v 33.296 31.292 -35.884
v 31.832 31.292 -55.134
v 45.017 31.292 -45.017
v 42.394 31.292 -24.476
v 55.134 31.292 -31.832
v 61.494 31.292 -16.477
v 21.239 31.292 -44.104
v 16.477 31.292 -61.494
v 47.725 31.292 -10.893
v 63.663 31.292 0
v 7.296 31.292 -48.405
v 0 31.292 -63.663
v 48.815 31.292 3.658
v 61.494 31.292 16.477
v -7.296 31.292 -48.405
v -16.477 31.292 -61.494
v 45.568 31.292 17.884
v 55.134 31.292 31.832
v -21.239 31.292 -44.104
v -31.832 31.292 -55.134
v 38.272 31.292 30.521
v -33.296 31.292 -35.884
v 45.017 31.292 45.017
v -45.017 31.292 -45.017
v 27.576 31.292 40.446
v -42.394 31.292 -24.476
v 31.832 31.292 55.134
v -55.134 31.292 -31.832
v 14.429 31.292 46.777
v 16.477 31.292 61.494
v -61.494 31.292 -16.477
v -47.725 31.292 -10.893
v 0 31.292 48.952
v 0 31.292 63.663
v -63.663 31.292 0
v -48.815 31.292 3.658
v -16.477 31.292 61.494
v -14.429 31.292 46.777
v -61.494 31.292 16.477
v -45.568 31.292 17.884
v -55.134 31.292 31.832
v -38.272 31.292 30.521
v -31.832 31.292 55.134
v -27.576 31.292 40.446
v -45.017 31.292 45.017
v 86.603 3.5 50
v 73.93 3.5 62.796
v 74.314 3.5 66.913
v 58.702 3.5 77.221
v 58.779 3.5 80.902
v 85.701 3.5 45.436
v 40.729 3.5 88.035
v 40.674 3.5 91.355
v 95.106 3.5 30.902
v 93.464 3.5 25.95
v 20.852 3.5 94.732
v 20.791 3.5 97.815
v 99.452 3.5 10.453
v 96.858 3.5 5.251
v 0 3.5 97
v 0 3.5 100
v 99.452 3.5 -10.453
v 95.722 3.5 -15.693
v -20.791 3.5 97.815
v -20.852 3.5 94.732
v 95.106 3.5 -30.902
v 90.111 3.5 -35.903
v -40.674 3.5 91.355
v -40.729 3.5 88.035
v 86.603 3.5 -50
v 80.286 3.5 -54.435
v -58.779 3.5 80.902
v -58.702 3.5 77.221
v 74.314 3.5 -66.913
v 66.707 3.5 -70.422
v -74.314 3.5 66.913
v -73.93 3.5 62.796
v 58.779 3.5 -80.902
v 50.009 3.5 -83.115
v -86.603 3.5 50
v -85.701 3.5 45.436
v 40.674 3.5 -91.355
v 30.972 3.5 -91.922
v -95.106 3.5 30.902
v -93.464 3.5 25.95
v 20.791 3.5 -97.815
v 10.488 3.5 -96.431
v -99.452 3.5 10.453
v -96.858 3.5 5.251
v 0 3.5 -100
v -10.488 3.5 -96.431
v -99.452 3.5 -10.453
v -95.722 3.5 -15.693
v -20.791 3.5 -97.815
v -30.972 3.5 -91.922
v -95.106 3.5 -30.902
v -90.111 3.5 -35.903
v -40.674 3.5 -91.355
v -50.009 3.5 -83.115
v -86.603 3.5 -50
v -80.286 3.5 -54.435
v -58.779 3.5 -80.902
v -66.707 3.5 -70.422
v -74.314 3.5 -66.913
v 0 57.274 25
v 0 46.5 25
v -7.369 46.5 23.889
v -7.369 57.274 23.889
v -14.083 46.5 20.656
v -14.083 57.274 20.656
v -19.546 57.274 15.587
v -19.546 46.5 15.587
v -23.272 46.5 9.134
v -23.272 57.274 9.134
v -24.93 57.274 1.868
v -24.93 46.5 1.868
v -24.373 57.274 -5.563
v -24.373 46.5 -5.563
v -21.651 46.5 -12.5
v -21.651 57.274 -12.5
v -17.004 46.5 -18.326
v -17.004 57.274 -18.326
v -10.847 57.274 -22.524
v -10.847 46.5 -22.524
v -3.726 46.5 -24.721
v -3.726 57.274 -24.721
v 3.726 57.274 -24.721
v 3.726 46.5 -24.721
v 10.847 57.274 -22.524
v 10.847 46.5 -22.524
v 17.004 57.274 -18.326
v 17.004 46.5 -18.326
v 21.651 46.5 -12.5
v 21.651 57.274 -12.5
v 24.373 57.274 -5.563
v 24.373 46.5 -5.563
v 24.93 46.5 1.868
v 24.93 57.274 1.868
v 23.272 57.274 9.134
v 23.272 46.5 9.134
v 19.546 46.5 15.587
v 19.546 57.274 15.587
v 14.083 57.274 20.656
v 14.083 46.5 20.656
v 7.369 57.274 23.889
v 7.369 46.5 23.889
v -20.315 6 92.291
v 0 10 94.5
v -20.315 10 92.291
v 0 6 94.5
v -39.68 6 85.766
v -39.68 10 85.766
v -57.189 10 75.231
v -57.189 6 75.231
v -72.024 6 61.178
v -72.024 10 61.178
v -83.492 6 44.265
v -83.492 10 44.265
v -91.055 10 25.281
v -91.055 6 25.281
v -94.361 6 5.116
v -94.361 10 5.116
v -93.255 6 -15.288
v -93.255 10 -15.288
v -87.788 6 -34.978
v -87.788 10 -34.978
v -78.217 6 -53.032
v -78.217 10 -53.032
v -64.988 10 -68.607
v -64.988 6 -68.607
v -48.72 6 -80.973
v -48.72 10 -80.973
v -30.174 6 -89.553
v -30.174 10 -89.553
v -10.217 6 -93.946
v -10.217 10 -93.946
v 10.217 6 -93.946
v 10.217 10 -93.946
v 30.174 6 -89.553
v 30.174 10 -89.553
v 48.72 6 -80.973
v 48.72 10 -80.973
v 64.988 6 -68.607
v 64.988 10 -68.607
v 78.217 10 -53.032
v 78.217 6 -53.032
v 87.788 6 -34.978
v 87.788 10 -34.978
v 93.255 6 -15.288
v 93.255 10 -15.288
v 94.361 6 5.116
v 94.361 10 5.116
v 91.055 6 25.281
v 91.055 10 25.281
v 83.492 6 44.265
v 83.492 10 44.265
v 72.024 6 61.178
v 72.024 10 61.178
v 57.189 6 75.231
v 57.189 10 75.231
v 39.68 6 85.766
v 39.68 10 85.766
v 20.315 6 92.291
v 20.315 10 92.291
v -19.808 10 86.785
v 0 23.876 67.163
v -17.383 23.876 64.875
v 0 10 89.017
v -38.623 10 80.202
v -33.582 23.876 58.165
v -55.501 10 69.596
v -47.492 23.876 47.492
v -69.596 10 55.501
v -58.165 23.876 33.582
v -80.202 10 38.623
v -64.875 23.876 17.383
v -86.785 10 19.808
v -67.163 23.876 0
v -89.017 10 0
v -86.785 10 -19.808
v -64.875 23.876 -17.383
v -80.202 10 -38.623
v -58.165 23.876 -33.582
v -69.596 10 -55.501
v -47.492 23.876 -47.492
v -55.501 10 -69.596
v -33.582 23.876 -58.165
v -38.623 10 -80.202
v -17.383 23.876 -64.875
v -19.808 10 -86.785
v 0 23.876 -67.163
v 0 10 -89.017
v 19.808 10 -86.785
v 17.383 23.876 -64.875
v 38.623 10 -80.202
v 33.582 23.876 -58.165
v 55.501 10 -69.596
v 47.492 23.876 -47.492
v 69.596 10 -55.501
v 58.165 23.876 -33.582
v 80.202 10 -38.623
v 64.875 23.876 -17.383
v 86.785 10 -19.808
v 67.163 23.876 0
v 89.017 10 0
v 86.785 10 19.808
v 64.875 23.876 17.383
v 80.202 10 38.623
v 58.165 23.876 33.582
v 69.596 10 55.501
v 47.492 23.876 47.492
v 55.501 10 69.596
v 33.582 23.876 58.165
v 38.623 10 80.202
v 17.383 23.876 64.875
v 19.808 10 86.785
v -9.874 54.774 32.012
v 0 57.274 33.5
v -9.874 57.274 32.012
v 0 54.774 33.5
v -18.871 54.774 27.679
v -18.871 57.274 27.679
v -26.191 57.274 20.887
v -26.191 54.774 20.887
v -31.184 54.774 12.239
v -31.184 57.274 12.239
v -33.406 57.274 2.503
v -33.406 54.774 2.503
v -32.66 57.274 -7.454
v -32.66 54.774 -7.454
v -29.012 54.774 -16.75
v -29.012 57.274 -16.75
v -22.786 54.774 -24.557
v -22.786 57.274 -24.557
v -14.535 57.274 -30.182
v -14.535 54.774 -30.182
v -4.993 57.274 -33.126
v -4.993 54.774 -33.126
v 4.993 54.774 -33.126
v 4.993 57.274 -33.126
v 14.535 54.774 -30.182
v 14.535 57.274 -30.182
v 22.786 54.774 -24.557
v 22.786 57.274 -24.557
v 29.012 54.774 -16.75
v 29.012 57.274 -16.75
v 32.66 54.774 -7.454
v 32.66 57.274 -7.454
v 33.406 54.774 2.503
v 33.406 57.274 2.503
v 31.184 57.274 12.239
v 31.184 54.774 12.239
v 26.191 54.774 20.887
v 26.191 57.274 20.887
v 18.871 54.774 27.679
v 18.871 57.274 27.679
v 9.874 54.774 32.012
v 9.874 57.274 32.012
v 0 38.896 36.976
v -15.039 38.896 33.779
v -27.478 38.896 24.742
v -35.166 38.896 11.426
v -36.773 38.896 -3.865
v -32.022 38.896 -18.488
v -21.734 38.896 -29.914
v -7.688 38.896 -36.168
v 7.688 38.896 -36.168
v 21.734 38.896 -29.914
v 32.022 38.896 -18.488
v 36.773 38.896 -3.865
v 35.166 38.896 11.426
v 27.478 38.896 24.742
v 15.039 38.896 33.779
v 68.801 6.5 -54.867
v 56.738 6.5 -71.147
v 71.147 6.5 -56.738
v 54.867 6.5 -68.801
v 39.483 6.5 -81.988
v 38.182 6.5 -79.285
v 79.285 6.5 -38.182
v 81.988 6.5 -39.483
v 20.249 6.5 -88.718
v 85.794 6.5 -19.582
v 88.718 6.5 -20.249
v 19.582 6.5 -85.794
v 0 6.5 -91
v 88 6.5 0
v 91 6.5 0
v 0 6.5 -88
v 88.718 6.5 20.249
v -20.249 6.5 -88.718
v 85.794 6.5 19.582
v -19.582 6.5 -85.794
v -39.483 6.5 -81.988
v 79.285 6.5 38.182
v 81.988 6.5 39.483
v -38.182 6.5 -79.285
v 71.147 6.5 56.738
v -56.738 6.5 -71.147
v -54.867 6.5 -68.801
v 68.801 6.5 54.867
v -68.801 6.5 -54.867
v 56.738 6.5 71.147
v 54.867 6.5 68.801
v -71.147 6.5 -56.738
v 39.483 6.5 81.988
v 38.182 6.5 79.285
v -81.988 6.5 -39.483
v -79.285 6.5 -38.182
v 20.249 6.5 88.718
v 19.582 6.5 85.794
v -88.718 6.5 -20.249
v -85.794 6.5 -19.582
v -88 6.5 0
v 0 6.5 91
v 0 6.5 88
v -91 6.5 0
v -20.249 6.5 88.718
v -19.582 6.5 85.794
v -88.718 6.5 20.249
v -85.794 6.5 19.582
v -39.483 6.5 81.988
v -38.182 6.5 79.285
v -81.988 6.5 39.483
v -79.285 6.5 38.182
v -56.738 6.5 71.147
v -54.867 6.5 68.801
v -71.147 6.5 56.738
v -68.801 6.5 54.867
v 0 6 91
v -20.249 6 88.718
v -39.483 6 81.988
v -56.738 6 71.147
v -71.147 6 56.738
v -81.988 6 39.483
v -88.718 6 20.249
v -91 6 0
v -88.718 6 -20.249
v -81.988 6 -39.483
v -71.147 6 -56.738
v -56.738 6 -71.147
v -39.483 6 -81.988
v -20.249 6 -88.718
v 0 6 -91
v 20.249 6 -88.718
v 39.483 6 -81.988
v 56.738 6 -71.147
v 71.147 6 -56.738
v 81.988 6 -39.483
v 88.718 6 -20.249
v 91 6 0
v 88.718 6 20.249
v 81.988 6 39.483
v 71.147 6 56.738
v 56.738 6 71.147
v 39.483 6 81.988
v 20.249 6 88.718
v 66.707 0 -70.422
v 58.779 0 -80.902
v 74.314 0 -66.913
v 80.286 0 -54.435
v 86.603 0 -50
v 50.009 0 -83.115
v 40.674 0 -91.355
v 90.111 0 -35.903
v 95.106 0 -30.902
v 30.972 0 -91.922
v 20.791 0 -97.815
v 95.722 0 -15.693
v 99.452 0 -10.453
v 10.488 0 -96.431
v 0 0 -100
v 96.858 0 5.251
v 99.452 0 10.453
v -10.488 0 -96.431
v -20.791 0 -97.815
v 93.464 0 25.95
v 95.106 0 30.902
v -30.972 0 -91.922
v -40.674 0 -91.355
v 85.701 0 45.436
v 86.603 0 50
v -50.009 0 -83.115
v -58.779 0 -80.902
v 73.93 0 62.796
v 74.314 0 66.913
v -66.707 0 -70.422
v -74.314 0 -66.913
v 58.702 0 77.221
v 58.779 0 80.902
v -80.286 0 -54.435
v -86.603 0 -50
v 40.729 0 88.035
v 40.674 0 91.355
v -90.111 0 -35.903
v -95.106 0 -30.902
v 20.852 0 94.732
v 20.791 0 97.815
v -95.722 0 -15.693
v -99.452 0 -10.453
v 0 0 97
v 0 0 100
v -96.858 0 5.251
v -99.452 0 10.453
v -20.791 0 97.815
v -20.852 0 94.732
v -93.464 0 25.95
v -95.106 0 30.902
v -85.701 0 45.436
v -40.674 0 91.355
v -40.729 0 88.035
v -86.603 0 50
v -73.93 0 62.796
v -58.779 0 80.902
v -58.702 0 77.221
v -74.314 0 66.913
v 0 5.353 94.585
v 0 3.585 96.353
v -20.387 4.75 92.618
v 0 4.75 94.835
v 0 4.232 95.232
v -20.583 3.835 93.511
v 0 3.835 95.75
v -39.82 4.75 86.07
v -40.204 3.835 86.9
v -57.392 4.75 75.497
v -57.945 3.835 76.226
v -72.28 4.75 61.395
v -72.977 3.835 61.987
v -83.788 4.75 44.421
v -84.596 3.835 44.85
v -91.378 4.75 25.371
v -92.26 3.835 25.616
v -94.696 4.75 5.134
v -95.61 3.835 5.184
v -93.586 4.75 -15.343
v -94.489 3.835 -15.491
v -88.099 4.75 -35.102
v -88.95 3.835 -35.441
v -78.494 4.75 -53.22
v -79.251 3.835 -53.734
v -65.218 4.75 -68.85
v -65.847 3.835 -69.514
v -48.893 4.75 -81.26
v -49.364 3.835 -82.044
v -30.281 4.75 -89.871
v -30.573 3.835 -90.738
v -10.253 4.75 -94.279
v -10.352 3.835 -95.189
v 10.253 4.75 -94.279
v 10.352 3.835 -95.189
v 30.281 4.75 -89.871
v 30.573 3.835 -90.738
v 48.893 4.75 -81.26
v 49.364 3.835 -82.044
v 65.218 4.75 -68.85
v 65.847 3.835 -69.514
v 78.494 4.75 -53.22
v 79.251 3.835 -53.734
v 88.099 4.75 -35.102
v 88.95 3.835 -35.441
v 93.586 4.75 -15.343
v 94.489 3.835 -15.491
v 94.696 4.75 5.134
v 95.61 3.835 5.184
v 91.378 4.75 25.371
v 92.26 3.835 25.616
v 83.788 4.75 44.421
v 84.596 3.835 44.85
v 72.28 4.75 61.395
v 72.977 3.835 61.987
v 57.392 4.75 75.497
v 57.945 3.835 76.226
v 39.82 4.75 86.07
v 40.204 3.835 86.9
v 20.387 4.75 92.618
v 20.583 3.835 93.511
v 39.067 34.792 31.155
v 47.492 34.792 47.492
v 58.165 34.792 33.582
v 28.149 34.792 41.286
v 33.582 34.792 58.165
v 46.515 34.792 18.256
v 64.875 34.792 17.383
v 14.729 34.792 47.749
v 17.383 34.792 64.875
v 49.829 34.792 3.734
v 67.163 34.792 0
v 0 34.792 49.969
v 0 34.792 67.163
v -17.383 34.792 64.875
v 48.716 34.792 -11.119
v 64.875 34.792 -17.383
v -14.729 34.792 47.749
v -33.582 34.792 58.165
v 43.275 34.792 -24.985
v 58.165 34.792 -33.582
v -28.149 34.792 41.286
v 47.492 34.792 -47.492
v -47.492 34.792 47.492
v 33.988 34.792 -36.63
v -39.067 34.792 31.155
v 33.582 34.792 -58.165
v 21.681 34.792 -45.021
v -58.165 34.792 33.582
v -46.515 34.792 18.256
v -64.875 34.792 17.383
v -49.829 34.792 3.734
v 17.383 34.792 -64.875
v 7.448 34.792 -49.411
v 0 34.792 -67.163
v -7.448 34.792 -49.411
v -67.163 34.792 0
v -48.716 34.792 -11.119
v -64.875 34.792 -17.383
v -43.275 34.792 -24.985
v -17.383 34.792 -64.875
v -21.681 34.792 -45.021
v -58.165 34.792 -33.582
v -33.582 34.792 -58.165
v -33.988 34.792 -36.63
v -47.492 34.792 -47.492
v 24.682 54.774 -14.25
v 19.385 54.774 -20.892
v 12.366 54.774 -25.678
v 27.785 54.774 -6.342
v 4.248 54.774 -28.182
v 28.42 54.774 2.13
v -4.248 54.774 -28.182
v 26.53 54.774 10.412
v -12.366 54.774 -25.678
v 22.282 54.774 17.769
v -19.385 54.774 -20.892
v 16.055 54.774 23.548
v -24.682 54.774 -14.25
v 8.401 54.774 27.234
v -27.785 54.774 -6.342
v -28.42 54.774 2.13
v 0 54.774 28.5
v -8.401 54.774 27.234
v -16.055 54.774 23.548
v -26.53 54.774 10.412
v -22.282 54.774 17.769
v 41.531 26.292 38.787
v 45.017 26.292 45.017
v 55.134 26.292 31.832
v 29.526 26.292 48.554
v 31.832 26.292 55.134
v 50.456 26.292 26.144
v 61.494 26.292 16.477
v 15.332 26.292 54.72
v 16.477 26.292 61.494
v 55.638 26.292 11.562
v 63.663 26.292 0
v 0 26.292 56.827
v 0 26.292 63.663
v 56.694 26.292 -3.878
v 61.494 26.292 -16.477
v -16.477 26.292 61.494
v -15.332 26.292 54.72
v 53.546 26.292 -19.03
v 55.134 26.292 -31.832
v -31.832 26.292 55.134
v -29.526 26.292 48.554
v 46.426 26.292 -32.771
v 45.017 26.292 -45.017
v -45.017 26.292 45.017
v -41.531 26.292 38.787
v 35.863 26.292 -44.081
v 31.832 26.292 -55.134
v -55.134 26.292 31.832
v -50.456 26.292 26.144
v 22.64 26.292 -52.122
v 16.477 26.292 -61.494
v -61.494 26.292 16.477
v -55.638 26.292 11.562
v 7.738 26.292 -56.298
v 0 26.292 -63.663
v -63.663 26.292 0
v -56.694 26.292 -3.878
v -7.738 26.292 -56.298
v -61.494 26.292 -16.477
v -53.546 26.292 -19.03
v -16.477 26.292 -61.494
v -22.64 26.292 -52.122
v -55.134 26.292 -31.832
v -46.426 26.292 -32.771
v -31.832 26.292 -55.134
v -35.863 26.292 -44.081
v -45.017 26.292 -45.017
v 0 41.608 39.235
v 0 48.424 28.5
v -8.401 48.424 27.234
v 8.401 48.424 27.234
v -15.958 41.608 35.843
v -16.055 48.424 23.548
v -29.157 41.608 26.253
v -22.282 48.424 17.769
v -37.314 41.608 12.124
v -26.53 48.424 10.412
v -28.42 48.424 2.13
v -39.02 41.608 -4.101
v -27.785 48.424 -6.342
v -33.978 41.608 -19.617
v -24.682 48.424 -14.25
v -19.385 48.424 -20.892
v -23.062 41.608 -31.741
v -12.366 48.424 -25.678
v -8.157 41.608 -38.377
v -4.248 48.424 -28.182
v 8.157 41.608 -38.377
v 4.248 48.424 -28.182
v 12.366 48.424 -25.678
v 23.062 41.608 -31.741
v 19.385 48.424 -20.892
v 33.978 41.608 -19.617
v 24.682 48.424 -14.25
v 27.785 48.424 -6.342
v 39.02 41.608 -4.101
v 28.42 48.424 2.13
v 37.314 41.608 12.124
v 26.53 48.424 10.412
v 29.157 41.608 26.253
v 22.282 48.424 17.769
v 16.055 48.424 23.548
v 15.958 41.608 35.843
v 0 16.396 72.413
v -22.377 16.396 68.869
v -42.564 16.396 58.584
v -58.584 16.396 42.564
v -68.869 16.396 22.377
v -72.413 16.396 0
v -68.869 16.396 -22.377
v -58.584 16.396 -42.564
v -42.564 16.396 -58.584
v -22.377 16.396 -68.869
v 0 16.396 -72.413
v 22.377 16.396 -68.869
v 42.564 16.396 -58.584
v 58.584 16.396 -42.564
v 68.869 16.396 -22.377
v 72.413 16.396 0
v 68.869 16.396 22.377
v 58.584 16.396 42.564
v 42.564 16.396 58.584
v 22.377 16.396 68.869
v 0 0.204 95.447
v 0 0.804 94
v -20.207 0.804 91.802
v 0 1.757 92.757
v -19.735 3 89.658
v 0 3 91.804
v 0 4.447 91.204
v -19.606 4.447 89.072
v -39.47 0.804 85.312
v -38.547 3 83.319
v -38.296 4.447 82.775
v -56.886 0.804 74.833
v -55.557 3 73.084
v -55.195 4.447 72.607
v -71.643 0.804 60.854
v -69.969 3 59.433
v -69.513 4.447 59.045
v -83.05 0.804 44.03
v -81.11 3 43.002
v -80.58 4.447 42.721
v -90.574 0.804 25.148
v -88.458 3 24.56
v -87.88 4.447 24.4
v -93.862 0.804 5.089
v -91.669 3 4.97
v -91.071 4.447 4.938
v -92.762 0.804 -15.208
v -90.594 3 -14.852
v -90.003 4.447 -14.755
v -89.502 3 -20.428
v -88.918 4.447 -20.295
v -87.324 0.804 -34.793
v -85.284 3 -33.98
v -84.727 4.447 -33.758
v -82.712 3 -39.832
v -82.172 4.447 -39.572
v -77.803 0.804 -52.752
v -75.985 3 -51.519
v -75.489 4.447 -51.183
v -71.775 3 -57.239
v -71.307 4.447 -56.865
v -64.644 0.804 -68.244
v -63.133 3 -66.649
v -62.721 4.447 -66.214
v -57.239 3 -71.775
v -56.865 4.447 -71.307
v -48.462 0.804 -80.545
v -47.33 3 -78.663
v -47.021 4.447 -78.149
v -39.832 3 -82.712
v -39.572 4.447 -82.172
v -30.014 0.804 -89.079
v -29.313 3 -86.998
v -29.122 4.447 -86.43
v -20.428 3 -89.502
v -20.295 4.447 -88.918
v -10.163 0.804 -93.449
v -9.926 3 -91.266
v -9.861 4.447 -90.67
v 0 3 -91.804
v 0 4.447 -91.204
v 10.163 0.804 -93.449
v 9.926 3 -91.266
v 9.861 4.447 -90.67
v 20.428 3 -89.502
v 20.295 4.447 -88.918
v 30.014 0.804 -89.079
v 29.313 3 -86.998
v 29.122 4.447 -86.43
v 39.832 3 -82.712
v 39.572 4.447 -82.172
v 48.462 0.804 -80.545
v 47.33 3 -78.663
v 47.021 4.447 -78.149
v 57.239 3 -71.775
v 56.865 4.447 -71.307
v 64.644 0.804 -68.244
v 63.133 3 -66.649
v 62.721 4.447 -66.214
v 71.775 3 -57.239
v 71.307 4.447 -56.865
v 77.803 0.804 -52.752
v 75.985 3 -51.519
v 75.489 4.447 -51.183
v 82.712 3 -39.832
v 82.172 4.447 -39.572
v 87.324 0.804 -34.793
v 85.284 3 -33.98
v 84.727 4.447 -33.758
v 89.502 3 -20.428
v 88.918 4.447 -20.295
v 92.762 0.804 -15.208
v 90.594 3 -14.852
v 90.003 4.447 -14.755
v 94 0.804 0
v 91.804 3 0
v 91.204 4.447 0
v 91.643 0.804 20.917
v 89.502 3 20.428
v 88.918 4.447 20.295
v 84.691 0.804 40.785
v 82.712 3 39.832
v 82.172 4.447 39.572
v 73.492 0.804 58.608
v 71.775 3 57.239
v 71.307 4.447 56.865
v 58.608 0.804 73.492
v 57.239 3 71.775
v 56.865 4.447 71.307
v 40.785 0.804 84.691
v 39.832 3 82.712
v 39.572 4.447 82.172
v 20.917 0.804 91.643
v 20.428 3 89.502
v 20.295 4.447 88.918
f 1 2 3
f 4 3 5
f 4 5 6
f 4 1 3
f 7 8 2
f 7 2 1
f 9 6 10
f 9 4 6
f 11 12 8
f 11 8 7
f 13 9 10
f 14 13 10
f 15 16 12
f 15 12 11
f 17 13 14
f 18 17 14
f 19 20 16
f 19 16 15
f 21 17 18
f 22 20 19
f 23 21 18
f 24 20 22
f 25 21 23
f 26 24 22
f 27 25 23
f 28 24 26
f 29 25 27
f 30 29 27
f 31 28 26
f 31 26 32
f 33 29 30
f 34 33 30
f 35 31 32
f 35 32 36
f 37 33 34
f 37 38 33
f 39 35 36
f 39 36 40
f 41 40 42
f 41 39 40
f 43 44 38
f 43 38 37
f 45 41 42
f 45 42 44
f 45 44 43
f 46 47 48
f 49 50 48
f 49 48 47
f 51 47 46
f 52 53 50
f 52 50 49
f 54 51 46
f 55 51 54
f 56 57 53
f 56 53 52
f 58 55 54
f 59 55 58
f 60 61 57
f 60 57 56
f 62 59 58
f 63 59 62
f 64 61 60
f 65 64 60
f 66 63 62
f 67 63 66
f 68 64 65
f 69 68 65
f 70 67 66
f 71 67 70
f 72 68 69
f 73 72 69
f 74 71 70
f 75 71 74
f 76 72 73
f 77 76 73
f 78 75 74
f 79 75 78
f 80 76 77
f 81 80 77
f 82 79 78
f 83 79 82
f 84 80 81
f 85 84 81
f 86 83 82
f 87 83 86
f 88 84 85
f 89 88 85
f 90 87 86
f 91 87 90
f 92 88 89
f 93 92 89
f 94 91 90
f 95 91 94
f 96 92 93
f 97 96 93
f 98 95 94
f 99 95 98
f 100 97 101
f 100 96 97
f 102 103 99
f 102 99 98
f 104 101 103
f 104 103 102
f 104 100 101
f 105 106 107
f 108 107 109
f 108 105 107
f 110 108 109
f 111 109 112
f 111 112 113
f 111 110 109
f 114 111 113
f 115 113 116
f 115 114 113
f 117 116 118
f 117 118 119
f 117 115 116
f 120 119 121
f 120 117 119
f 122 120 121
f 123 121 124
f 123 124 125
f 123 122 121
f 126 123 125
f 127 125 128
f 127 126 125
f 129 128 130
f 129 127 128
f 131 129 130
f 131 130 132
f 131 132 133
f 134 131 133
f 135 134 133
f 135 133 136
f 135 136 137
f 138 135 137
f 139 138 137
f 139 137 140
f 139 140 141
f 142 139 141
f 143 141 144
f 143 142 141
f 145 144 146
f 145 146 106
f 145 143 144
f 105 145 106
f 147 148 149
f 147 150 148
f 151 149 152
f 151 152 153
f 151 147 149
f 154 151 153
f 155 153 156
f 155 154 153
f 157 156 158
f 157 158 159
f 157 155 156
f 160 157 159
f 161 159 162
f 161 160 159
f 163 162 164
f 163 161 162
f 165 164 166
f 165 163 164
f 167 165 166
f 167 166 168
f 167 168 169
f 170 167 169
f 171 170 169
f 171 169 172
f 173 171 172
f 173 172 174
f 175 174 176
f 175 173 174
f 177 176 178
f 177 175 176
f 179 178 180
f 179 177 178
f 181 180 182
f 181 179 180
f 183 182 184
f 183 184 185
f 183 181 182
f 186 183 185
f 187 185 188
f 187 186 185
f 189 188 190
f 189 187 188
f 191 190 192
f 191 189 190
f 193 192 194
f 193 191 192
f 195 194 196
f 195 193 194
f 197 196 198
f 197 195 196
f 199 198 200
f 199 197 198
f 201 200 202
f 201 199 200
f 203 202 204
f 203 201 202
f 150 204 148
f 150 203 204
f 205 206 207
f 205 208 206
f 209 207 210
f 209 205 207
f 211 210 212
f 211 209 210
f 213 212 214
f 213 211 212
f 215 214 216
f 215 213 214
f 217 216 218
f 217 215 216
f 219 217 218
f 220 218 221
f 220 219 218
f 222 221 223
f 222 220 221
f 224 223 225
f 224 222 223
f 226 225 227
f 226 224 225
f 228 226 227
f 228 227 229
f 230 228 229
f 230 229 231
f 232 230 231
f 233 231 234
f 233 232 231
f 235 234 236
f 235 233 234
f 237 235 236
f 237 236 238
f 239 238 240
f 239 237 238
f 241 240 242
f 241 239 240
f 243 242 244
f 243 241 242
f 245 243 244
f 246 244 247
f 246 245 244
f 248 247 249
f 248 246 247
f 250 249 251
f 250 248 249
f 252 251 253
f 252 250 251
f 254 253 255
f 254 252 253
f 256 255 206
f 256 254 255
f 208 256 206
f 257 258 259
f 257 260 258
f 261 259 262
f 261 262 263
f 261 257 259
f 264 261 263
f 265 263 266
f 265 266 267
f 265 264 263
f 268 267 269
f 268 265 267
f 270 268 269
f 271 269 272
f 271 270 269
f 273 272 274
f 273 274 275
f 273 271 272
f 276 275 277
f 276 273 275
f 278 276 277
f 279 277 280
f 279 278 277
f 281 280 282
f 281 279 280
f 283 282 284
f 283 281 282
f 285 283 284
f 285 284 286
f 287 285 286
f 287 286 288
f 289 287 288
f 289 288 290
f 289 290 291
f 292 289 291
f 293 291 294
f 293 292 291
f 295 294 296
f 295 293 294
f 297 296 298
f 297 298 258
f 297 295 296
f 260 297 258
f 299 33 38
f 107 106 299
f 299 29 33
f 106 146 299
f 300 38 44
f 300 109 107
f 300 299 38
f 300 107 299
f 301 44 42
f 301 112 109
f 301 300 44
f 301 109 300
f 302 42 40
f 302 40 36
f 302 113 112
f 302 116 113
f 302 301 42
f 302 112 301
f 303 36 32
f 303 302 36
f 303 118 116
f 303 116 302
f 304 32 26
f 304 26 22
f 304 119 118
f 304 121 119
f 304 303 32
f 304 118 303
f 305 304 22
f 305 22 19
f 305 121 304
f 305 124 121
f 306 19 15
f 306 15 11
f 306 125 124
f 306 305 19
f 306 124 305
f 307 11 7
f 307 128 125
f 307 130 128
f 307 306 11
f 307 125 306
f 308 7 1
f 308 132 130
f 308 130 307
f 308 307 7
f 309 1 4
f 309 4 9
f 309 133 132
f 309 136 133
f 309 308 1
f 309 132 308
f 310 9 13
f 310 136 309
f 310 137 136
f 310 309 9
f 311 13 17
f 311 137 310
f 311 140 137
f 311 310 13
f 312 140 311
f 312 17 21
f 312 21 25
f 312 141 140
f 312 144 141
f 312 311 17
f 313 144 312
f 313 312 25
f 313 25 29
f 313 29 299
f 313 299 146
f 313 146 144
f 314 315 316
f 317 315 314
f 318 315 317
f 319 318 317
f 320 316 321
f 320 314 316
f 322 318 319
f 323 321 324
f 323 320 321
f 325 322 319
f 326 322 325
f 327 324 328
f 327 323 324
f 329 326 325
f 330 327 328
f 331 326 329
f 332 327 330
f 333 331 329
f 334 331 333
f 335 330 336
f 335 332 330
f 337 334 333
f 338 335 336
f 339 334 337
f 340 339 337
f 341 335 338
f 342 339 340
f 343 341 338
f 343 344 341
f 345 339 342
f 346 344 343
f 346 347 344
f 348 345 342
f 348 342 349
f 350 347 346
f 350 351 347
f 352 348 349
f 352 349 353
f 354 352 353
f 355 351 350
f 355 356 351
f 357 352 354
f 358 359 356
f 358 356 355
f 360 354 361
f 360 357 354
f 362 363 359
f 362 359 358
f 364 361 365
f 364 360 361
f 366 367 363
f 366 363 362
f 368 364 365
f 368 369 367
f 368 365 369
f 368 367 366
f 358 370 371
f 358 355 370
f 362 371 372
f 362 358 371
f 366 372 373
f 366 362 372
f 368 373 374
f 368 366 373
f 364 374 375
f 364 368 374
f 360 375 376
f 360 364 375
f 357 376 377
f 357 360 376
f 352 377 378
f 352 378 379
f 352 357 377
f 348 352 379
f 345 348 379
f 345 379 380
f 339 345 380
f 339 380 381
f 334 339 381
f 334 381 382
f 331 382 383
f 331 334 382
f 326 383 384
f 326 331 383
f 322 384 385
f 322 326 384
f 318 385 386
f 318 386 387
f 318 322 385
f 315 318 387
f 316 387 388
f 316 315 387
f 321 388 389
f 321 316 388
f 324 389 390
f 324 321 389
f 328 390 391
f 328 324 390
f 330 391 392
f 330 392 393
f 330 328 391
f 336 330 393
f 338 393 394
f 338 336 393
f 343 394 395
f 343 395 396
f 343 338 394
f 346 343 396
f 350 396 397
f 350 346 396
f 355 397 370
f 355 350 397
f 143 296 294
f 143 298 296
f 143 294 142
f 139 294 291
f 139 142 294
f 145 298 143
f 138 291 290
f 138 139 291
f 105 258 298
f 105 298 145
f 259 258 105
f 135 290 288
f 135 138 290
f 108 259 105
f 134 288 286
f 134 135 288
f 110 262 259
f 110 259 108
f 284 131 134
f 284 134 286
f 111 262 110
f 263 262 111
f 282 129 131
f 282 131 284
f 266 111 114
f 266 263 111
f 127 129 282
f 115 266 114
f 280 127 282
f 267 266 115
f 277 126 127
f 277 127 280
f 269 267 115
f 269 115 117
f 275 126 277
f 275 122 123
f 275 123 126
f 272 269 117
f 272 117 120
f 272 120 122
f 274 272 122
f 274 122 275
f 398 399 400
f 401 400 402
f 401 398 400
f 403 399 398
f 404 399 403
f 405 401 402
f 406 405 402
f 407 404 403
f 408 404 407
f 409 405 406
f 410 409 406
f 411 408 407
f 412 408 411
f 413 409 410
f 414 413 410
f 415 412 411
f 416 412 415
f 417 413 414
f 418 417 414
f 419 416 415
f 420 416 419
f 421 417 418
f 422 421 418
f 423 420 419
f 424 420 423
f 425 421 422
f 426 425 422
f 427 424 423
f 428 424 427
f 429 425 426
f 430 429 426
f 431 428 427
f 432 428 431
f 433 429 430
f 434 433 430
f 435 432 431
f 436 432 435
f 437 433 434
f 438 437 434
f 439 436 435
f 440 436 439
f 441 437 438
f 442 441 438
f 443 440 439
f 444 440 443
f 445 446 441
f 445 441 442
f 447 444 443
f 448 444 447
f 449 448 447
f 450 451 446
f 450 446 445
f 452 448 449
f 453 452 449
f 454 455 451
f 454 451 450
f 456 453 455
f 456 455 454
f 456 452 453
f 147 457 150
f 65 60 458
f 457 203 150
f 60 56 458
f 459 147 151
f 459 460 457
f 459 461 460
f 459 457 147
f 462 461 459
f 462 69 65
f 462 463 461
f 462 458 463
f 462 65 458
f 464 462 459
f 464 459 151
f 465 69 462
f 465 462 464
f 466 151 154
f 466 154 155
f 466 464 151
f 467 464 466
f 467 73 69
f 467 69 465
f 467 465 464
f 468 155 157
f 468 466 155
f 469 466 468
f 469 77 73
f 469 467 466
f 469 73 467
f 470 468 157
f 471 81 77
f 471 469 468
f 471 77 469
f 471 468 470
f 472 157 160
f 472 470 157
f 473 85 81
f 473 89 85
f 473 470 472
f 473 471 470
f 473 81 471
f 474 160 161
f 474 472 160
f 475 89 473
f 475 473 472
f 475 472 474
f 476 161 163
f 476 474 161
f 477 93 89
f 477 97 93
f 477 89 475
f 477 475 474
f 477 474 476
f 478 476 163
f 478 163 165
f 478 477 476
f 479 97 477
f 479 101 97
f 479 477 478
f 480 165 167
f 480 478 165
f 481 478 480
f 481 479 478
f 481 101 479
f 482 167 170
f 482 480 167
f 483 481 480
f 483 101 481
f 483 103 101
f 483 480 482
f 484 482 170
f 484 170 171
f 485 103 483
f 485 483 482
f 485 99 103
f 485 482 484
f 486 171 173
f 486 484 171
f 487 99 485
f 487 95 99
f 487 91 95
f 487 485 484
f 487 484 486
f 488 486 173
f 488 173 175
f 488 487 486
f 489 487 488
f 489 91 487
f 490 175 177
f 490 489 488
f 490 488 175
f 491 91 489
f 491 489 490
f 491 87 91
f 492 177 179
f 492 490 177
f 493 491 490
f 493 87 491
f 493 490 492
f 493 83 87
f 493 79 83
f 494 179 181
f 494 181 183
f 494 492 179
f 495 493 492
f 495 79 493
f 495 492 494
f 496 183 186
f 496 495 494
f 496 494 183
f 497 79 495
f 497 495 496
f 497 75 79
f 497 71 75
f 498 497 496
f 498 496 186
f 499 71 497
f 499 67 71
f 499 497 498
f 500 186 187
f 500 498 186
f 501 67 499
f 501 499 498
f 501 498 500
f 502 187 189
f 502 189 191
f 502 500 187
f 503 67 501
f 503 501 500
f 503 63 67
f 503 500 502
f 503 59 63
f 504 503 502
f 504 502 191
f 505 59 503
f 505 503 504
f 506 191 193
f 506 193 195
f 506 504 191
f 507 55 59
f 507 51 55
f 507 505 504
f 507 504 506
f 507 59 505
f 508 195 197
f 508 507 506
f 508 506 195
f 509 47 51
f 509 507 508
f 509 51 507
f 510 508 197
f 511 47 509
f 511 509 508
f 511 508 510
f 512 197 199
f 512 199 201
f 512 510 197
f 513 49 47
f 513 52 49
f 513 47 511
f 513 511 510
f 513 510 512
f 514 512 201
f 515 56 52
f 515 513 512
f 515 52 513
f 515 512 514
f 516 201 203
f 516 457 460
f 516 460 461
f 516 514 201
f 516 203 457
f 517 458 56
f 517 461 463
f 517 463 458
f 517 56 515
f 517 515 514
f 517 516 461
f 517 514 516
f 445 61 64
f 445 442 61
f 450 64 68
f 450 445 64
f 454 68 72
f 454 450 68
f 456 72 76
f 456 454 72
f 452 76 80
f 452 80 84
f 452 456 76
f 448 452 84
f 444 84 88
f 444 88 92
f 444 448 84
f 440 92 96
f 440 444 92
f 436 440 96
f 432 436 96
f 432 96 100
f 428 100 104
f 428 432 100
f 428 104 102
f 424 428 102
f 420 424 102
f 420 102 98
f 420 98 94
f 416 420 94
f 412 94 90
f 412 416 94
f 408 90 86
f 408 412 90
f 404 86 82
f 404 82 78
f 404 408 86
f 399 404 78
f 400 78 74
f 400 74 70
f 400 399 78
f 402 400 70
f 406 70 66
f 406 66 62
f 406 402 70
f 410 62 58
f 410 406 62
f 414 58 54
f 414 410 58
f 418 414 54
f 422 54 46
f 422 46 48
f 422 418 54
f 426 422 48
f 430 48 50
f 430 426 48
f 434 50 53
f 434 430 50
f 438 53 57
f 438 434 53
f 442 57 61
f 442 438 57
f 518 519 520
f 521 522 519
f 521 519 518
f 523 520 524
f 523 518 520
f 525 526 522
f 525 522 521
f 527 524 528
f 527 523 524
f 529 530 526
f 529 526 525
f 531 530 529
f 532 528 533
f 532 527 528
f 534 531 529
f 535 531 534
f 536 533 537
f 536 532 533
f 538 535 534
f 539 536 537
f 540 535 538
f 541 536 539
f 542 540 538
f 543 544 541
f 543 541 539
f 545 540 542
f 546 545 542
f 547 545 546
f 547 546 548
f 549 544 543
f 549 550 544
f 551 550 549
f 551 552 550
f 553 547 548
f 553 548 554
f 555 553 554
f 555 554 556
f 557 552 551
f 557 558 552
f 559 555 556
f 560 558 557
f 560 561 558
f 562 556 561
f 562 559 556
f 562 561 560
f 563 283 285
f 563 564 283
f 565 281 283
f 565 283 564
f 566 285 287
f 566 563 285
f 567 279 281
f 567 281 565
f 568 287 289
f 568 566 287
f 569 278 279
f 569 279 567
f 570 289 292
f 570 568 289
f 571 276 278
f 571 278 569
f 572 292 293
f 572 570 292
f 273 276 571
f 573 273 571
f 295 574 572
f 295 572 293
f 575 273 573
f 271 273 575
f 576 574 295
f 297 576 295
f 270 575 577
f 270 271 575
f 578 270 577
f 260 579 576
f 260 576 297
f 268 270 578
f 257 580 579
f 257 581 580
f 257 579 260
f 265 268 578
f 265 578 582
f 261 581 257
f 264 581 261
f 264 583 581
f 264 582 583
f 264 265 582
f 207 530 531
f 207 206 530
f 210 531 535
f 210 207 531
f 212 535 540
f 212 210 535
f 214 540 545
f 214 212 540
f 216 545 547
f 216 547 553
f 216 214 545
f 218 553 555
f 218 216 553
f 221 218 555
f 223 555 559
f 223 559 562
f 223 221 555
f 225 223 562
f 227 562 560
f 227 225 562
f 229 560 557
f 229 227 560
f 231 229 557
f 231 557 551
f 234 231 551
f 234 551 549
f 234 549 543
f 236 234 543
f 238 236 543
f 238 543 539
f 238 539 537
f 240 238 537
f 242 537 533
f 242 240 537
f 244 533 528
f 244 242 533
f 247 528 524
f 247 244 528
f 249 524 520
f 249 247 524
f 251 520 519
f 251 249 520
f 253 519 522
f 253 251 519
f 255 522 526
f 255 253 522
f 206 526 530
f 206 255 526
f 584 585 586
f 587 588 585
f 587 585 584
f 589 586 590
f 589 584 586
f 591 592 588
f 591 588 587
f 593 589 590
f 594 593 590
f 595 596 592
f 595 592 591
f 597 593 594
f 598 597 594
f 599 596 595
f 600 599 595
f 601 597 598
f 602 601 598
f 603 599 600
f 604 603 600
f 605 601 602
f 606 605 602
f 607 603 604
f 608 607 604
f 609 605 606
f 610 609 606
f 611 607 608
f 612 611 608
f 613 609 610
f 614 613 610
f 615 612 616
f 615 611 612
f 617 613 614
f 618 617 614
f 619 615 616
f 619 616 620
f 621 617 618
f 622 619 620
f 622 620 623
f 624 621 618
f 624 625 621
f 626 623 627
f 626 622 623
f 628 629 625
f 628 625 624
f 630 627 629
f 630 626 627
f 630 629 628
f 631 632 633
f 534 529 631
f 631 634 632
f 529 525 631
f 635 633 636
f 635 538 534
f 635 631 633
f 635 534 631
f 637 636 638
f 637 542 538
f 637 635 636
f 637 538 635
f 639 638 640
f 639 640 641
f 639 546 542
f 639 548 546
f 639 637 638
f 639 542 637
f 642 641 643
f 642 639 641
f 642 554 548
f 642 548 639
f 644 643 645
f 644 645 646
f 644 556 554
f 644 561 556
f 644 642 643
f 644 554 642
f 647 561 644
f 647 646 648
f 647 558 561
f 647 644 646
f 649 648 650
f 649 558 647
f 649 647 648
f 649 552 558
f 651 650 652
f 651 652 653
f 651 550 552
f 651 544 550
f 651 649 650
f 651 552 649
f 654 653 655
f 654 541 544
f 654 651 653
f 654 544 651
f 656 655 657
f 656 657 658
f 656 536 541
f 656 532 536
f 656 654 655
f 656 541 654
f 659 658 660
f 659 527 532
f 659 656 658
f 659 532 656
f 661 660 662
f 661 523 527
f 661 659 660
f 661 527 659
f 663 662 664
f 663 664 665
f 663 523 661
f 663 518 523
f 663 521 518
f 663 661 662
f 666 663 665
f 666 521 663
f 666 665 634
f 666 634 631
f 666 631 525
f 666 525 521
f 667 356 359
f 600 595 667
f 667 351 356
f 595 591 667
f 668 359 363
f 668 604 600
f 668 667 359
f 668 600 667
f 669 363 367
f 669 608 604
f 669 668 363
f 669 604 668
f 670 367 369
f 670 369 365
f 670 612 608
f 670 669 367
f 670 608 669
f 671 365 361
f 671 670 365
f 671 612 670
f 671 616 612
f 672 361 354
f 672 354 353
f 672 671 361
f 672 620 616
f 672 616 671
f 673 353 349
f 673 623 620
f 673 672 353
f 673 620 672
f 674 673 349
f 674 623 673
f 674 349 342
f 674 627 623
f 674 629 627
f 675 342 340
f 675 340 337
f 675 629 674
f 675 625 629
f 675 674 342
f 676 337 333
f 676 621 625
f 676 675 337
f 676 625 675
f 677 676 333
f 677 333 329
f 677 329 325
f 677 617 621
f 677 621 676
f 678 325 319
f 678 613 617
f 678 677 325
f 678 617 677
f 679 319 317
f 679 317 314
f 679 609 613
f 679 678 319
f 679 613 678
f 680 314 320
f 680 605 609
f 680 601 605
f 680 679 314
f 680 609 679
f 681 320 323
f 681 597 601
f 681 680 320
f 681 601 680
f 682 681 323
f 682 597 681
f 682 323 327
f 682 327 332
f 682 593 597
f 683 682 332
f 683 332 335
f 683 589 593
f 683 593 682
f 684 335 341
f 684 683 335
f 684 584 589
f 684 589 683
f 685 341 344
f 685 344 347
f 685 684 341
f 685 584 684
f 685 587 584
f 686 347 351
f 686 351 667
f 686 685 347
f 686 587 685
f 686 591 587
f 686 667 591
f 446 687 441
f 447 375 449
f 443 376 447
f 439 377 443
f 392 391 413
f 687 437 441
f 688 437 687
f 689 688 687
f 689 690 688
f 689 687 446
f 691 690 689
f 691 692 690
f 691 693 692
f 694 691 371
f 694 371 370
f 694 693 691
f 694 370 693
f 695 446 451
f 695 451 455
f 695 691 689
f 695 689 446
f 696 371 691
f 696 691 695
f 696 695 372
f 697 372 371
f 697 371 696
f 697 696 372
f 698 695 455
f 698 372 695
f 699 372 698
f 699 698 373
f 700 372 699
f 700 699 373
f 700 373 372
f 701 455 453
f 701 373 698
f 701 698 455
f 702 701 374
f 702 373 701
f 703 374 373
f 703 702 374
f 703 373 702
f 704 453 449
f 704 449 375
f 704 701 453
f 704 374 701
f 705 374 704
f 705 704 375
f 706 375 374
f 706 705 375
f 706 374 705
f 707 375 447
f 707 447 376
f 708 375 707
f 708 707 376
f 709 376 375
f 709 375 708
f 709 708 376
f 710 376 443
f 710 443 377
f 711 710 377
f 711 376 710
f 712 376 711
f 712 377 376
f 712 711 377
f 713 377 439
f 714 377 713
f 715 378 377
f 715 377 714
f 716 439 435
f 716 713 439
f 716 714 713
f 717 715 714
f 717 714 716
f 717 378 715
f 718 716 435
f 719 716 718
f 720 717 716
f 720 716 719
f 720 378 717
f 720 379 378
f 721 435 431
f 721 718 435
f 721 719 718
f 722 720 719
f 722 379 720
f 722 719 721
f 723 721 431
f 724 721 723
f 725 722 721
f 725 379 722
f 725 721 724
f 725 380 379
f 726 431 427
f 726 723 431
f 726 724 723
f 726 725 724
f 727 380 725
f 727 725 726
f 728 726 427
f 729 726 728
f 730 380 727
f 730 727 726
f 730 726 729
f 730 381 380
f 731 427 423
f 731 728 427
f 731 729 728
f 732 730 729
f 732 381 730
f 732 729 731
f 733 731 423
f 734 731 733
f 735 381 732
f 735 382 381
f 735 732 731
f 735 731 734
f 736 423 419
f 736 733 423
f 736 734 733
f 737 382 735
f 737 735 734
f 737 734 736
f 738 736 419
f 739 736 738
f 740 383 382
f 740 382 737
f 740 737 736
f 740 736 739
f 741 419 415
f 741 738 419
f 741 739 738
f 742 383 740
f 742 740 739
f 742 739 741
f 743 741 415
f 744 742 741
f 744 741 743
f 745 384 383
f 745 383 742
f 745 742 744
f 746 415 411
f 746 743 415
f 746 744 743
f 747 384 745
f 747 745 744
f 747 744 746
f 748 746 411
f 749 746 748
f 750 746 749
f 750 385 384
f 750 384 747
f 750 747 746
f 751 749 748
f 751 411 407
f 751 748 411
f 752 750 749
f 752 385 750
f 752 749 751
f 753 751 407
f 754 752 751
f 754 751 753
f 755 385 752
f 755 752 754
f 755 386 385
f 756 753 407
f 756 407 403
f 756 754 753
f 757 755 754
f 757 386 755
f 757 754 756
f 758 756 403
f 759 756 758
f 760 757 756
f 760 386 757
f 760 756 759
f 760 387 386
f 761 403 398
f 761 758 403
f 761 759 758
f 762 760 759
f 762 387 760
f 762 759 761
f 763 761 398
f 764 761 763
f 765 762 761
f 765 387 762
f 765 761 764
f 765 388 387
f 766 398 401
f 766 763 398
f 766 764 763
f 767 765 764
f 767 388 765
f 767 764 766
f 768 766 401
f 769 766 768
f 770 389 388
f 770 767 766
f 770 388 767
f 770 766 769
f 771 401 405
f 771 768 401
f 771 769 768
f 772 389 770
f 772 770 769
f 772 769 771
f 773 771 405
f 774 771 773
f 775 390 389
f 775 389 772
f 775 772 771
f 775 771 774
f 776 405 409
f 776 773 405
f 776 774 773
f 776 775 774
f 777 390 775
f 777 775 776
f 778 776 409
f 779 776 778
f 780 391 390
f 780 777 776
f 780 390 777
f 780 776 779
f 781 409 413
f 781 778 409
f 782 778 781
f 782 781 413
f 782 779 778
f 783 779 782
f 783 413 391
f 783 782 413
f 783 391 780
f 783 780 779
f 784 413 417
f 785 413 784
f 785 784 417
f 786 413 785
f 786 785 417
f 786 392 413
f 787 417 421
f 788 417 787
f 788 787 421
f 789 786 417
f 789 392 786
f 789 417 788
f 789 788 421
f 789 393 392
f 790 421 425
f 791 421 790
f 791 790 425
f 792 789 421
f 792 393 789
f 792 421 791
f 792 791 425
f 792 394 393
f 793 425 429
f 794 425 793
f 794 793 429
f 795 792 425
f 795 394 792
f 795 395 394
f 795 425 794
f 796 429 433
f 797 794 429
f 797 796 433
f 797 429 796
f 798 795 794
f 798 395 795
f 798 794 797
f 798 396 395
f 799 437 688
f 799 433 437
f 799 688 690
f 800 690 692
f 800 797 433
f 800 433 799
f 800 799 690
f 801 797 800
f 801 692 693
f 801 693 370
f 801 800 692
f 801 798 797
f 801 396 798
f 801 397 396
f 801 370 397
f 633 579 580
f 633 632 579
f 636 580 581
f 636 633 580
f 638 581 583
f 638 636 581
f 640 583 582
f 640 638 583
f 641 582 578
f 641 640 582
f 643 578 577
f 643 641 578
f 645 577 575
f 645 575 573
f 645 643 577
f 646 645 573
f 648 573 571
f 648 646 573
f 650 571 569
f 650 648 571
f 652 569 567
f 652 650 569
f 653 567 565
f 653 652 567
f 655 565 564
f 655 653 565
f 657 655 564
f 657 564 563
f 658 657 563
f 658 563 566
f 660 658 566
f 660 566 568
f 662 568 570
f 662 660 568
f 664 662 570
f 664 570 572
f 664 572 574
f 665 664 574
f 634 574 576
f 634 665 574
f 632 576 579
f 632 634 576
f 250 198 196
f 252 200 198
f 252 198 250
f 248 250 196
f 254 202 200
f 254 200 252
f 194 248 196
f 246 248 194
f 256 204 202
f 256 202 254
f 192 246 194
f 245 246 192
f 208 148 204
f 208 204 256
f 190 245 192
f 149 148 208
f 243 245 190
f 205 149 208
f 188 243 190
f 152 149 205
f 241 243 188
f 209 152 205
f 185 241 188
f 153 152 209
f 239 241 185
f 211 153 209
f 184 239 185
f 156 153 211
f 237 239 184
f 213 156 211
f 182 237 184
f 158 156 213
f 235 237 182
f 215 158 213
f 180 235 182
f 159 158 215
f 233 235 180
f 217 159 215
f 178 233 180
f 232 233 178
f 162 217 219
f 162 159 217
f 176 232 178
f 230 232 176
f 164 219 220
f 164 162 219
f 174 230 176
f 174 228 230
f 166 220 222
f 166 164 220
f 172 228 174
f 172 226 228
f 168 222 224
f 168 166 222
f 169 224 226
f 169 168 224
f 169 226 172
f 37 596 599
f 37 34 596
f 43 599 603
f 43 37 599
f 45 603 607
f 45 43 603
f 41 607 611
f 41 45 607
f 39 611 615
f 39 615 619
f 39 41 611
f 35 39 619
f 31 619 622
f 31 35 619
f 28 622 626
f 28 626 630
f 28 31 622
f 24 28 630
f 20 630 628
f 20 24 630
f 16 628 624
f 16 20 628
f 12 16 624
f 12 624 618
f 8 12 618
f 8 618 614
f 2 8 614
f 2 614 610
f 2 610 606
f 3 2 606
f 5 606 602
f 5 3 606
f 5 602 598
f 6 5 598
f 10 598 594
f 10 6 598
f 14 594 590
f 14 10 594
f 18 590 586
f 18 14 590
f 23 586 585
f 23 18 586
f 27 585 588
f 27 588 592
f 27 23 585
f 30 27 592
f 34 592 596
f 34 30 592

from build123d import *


with BuildPart() as part:
    # Sketch1 → Revolve1 (revolve)
    with BuildSketch(Plane.XY, mode=Mode.PRIVATE) as revolve1_sk:
        with BuildLine():
            Line((88, 6.5), (56.826927003, 26.292427299))
            Line((56.826927003, 26.292427299), (63.663285359, 26.292427299))
            Line((63.663285359, 26.292427299), (63.663285359, 31.292427299))
            Line((63.663285359, 31.292427299), (48.951927003, 31.292427299))
            Line((48.951927003, 31.292427299), (25, 46.5))
            Line((25, 46.5), (25, 57.273651824))
            Line((25, 57.273651824), (33.5, 57.273651824))
            Line((33.5, 57.273651824), (33.5, 54.773651824))
            Line((33.5, 54.773651824), (28.5, 54.773651824))
            Line((28.5, 54.773651824), (28.5, 48.423651824))
            Line((28.5, 48.423651824), (49.969178626, 34.792427299))
            Line((49.969178626, 34.792427299), (67.163285359, 34.792427299))
            Line((67.163285359, 34.792427299), (67.163285359, 23.875534136))
            Line((67.163285359, 23.875534136), (89.017251622, 10))
            Line((89.017251622, 10), (94.5, 10))
            Line((94.5, 10), (94.5, 6))
            ThreePointArc((94.5, 6), (95.232233047, 4.232233047), (97, 3.5))
            Line((97, 3.5), (100, 3.5))
            Line((100, 3.5), (100, 0))
            Line((100, 0), (97, 0))
            ThreePointArc((97, 0), (92.757359313, 1.757359313), (91, 6))
            Line((91, 6), (91, 6.5))
            Line((91, 6.5), (88, 6.5))
        make_face()
    revolve(revolve1_sk.sketch.rotate(Axis((0, 60.137334415, 0), (0, -1, 0)), 90), axis=Axis((0, 60.137334415, 0), (0, -1, 0)))


solid = part.part
